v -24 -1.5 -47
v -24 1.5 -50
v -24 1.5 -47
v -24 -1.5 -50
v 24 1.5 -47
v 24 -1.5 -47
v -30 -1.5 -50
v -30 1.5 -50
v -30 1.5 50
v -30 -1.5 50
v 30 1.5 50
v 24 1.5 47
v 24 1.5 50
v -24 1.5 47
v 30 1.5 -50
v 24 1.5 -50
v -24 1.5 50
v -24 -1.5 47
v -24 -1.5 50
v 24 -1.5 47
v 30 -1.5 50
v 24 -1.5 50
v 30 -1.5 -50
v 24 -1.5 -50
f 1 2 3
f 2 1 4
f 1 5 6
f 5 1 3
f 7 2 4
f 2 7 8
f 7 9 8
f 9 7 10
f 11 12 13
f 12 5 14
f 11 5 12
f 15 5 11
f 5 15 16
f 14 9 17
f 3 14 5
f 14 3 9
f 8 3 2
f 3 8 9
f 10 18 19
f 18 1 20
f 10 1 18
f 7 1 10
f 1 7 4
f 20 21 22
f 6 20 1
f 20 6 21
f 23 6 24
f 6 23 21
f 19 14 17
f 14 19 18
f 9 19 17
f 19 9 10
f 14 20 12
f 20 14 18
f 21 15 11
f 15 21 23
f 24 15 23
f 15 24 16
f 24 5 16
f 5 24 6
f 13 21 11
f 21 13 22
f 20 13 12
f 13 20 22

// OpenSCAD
// file: measures.scad
/**
 * Pencil box configuration
 * All measures in millimeters
 */

// rendering parameters
$fn = 200;
nothing = 0.005;

// material to cut from
material_x = 350;
material_y = 180;
material_z = 3;

// total size of the box
box_x = 130;
box_y = 70;
box_z = 100;

// measures of the two half circles left and right
curvature_y = box_y;
curvature_x = curvature_y/2;

// measure of rectangle between half circles
rect_x = box_x - 2*curvature_x;
rect_y = box_y;

top_opening_inset = 5.7*material_z;

wall_z = box_z - 2*material_z;

// distance between wall and outer edge
wall_inset = material_z;

curve_radius = box_y/2 - wall_inset - material_z;
curve_length = curve_radius*PI;

// total wall length without anchor
wall_length = 2*rect_x + 2*curve_length;

// nose properties
nose_x = 2*material_z;
nose_z = material_z;

// anchor
anchor_width = 10;
anchor_height = 30;
anchor_length = 20;

// for preview
pillar_count = 20;
pillar_angle = 180 / (pillar_count-1);
pillar_width = 4;

part_spacing = 1;
// main file
include <measures.scad>;

module wall_noses(x)
{
    for (z=[
        -wall_z/2-nose_z/2,
        +wall_z/2+nose_z/2
        ])
    {
        translate([
            x,
            0,
            z
            ])
        cube([
            nose_x,
            material_z,
            nose_z
            ], center=true);
    }
}

module wall_noses_left()
{
    wall_noses(-rect_x/2+nose_x/2);
}

module wall_noses_right()
{
    wall_noses(+rect_x/2-nose_x/2);
}

module wall_front()
{
    // base material
    cube([
        rect_x,
        material_z,
        wall_z
        ], center=true);

    // noses to top and bottom
    wall_noses_left();
    wall_noses_right();
}

wall_front();
